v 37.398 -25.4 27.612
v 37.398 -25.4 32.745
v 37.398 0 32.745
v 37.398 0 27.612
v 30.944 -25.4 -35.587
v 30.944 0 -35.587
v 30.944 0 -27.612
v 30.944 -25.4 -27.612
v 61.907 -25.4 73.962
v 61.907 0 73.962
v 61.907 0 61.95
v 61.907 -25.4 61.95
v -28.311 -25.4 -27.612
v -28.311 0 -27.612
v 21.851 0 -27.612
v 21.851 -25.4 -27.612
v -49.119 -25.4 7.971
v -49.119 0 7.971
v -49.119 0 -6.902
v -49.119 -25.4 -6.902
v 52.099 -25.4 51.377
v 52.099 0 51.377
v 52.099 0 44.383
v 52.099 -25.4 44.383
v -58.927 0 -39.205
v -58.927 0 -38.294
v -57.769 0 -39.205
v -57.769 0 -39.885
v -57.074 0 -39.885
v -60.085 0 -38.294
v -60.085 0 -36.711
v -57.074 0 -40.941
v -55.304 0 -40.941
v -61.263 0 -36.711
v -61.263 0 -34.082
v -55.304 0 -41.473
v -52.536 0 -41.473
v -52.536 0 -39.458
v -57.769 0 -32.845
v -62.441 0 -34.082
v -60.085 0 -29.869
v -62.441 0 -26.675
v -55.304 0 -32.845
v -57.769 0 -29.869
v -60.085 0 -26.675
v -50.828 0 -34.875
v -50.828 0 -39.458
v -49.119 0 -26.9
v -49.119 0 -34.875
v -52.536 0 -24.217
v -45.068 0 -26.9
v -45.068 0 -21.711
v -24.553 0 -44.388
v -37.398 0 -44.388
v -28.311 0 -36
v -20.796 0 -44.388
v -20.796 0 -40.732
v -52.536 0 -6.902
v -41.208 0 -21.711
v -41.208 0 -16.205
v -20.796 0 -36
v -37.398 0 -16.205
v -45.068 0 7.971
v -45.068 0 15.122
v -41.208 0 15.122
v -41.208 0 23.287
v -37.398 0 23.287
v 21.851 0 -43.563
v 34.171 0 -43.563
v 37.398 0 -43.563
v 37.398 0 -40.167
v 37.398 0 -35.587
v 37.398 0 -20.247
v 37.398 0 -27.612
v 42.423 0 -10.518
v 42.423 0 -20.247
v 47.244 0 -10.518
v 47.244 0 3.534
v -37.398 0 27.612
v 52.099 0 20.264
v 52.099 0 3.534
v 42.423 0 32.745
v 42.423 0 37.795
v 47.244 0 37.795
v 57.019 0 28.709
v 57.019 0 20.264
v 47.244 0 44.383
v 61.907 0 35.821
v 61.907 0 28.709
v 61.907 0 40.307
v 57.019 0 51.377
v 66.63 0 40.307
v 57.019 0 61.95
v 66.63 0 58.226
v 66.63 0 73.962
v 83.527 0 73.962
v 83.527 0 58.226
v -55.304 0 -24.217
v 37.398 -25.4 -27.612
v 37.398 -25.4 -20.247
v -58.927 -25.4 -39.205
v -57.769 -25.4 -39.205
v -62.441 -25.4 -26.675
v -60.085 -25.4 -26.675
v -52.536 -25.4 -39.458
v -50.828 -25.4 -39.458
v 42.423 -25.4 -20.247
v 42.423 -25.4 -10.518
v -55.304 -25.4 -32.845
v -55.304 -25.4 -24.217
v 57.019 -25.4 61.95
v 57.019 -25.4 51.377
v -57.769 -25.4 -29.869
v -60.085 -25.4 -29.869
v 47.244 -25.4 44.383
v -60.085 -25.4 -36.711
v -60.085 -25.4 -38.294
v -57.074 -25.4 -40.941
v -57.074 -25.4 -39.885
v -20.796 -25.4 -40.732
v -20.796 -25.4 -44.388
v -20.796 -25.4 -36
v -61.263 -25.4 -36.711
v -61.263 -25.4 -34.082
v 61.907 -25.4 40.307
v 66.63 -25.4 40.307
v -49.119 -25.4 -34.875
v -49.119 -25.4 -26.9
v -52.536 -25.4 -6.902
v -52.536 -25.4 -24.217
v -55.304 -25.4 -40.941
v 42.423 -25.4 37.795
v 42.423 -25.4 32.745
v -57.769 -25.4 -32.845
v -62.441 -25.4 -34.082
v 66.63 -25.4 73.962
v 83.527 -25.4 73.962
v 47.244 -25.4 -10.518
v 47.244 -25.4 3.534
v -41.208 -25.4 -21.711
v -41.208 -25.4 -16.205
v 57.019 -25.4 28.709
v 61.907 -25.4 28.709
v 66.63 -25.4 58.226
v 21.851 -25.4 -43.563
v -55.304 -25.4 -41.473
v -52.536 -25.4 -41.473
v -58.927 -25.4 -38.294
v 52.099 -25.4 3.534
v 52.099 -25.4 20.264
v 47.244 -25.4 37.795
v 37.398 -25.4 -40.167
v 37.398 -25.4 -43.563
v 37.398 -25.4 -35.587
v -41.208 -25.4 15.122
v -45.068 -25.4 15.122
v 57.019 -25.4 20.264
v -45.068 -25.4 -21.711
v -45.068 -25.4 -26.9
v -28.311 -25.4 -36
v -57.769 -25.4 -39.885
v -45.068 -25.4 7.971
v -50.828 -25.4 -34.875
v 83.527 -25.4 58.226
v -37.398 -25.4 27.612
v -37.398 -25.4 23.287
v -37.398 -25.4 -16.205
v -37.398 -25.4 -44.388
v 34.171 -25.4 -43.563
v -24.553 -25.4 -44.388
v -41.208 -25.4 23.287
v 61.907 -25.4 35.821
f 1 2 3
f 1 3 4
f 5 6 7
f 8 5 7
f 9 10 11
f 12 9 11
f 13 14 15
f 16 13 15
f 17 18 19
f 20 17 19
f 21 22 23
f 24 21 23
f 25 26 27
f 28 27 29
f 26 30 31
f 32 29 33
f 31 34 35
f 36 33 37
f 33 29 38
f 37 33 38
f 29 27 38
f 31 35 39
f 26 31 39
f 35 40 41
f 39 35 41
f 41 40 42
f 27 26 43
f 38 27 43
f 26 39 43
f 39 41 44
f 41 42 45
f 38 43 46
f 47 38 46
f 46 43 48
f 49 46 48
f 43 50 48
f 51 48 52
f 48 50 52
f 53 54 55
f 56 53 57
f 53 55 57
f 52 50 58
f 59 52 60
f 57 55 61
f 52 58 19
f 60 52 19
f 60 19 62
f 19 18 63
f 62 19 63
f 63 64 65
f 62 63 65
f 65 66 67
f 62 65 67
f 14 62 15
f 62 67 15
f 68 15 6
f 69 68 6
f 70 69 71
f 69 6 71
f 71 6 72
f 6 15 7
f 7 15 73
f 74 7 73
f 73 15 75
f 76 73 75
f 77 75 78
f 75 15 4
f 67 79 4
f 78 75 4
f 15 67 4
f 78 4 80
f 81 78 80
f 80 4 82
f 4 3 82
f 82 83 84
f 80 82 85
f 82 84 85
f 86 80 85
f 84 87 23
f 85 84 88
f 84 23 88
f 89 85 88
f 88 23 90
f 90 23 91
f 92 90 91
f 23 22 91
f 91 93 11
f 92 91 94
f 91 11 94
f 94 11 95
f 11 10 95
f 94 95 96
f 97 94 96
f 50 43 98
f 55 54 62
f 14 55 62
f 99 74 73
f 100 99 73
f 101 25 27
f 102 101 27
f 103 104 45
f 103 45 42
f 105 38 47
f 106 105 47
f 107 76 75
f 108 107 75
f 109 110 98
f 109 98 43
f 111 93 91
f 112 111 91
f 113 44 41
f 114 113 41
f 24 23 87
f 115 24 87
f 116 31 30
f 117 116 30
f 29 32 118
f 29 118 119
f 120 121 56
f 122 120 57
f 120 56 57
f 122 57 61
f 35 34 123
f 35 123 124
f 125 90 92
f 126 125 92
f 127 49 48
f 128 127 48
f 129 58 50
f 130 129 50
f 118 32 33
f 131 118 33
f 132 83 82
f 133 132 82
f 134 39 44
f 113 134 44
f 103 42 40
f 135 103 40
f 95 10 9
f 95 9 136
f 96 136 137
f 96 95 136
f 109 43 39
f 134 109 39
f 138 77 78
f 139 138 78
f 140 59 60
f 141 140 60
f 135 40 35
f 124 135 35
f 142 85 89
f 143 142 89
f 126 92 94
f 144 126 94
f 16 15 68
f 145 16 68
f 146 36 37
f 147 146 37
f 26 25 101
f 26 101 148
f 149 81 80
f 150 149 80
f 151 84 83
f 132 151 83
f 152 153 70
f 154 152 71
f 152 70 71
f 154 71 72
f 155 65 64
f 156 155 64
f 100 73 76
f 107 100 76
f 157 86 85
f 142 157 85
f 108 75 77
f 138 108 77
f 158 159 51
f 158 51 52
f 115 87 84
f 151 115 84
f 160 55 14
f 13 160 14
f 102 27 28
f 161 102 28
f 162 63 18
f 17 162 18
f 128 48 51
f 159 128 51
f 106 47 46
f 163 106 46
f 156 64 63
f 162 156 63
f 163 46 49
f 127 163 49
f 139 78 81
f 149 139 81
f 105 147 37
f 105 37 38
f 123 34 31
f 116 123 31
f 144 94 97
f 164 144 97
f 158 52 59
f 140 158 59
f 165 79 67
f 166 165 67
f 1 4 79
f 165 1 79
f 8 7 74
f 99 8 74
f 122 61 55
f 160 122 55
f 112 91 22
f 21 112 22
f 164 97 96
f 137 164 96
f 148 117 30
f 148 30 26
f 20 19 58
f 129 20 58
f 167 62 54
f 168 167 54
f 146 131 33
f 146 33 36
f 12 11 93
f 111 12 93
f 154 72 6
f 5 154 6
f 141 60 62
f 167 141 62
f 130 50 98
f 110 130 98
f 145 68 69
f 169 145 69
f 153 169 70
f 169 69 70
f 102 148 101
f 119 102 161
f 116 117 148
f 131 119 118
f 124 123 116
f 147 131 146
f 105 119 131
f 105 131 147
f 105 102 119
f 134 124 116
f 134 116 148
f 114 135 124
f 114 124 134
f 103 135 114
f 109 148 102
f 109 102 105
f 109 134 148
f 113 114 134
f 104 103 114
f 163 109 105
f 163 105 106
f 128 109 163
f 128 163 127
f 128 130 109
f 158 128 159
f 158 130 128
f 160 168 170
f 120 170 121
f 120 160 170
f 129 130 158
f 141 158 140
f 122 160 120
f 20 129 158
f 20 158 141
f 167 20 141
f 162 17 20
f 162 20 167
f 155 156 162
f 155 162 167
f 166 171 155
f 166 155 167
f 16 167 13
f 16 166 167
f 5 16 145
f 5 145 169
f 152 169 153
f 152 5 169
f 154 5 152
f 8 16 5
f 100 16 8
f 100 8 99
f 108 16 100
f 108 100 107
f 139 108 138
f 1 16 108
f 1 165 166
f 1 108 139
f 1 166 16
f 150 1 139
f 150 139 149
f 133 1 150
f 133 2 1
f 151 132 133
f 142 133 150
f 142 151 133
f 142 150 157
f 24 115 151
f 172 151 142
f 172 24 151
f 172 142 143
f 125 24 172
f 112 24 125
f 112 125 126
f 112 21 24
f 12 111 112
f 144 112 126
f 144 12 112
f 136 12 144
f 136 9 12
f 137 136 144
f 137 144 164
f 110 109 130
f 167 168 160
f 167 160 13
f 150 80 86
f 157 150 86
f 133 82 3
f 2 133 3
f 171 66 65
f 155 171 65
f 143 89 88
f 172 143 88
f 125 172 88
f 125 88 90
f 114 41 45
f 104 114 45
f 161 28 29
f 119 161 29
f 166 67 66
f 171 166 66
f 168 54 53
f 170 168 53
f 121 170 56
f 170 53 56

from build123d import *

# Parameters (mm, degrees)
F0_W     = 3.2269247949
F0_H     = 3.3961120509
F0_W_2   = 3.7572830241
F0_H_2   = 3.6561227749
F0_W_3   = 4.8879086971
F0_H_3   = 7.111184299
F0_W_4   = 1.7087571323
F0_H_4   = 4.5836493373
F0_W_5   = 16.8966799974
F0_H_5   = 15.7367065549
F0_W_6   = 1.7694719136
F0_H_6   = 1.0562464595
F0_W_7   = 1.1583864689
F0_H_7   = 0.9117685258
F0_W_8   = 1.178054139
F0_H_8   = 2.6293583214
F1_DEPTH = 25.4


with BuildPart() as f1:
    # F0 (on Front) → F1 (new body)
    with BuildSketch(Plane.XZ):
        Polygon((37.3980215415, -20.2466417104), (37.3980215415, 27.6115918206), (-37.3980215415, 27.6115918206), (-37.3980215415, 23.2865139842), (-37.3980215415, -16.2047892809), (-37.3980215415, -27.6115918206), (-28.3106606554, -27.6115918206), (21.8509719518, -27.6115918206), (30.9441719518, -27.6115918206), (37.3980215415, -27.6115918206), align=None)
        Polygon((37.3980215415, 32.7450931072), (37.3980215415, 27.6115918206), (37.3980215415, -20.2466417104), (42.4228385091, -20.2466417104), (42.4228385091, -10.5181215331), (42.4228385091, 32.7450931072), align=None)
        Polygon((-37.3980215415, -16.2047892809), (-37.3980215415, 23.2865139842), (-41.2078462541, 23.2865139842), (-41.2078462541, 15.1224471629), (-41.2078462541, -16.2047892809), align=None)
        Polygon((42.4228385091, 37.7946980298), (42.4228385091, 32.7450931072), (42.4228385091, -10.5181215331), (47.24393785, -10.5181215331), (47.24393785, 3.5339901224), (47.24393785, 37.7946980298), align=None)
        Polygon((30.9441719518, -35.5871918206), (30.9441719518, -27.6115918206), (21.8509719518, -27.6115918206), (21.8509719518, -35.5871918206), (21.8509719518, -43.5627918206), (30.9441719518, -43.5627918206), align=None)
        Polygon((-28.3106606554, -27.6115918206), (-37.3980215415, -27.6115918206), (-37.3980215415, -44.3883202384), (-28.3106606554, -44.3883202384), (-28.3106606554, -35.9999560295), align=None)
        Polygon((-41.2078462541, -21.7107832432), (-41.2078462541, -16.2047892809), (-41.2078462541, 15.1224471629), (-45.0683757663, 15.1224471629), (-45.0683757663, 7.9709775746), (-45.0683757663, -21.7107832432), align=None)
        Polygon((37.3980215415, -35.5871918206), (30.9441719518, -35.5871918206), (30.9441719518, -43.5627918206), (34.1710967466, -43.5627918206), (34.1710967466, -40.1666797698), (37.3980215415, -40.1666797698), align=None)
        Polygon((47.24393785, 44.3825013936), (47.24393785, 37.7946980298), (47.24393785, 3.5339901224), (52.0987957716, 3.5339901224), (52.0987957716, 20.2638655901), (52.0987957716, 44.3825013936), align=None)
        Polygon((-20.7960946072, -35.9999560295), (-28.3106606554, -35.9999560295), (-28.3106606554, -44.3883202384), (-24.5533776313, -44.3883202384), (-24.5533776313, -40.7321974635), (-20.7960946072, -40.7321974635), align=None)
        Polygon((-45.0683757663, -26.9003435969), (-45.0683757663, -21.7107832432), (-45.0683757663, 7.9709775746), (-49.1187684238, 7.9709775746), (-49.1187684238, -6.9015473127), (-49.1187684238, -26.9003435969), align=None)
        with Locations((35.7845591441, -41.8647357952)):
            Rectangle(F0_W, F0_H)
        Polygon((52.0987957716, 51.3773448765), (52.0987957716, 44.3825013936), (52.0987957716, 20.2638655901), (57.0190772414, 20.2638655901), (57.0190772414, 28.7094209343), (57.0190772414, 35.8206052333), (57.0190772414, 51.3773448765), align=None)
        with Locations((-22.6747361192, -42.5602588509)):
            Rectangle(F0_W_2, F0_H_2)
        Polygon((-49.1187684238, -34.8745509982), (-49.1187684238, -26.9003435969), (-49.1187684238, -6.9015473127), (-52.5362826884, -6.9015473127), (-52.5362826884, -24.2168344557), (-52.5362826884, -34.8745509982), (-50.8275255561, -34.8745509982), align=None)
        Polygon((57.0190772414, 61.949711293), (57.0190772414, 51.3773448765), (57.0190772414, 35.8206052333), (61.9069859385, 35.8206052333), (61.9069859385, 40.3074584901), (61.9069859385, 61.949711293), align=None)
        with Locations((59.46303159, 32.2650130838)):
            Rectangle(F0_W_3, F0_H_3)
        with Locations((-51.6819041222, -37.1663756669)):
            Rectangle(F0_W_4, F0_H_4)
        Polygon((-52.5362826884, -34.8745509982), (-52.5362826884, -24.2168344557), (-55.3043186665, -24.2168344557), (-55.3043186665, -32.844690606), (-55.3043186665, -39.8848950863), (-55.3043186665, -40.9411415458), (-55.3043186665, -41.4725467563), (-52.5362826884, -41.4725467563), (-52.5362826884, -39.4582003355), align=None)
        Polygon((61.9069859385, 73.9622488618), (61.9069859385, 61.949711293), (61.9069859385, 40.3074584901), (66.6303560138, 40.3074584901), (66.6303560138, 58.2255423069), (66.6303560138, 73.9622488618), align=None)
        Polygon((-55.3043186665, -39.8848950863), (-55.3043186665, -32.844690606), (-57.7685758471, -32.844690606), (-57.7685758471, -38.2937081158), (-57.7685758471, -39.2054766417), (-57.7685758471, -39.8848950863), (-57.07379058, -39.8848950863), align=None)
        with Locations((75.0786960125, 66.0938955843)):
            Rectangle(F0_W_5, F0_H_5)
        with Locations((-56.1890546232, -40.413018316)):
            Rectangle(F0_W_6, F0_H_6)
        Polygon((-57.7685758471, -38.2937081158), (-57.7685758471, -32.844690606), (-57.7685758471, -29.8693664372), (-60.0853487849, -29.8693664372), (-60.0853487849, -34.0815372765), (-60.0853487849, -36.7108955979), (-60.0853487849, -38.2937081158), (-58.926962316, -38.2937081158), align=None)
        with Locations((-58.3477690816, -38.7495923787)):
            Rectangle(F0_W_7, F0_H_7)
        Polygon((-60.0853487849, -34.0815372765), (-60.0853487849, -29.8693664372), (-60.0853487849, -26.6751870513), (-62.441457063, -26.6751870513), (-62.441457063, -34.0815372765), (-61.2634029239, -34.0815372765), align=None)
        with Locations((-60.6743758544, -35.3962164372)):
            Rectangle(F0_W_8, F0_H_8)
    extrude(amount=F1_DEPTH)


solid = f1.part
